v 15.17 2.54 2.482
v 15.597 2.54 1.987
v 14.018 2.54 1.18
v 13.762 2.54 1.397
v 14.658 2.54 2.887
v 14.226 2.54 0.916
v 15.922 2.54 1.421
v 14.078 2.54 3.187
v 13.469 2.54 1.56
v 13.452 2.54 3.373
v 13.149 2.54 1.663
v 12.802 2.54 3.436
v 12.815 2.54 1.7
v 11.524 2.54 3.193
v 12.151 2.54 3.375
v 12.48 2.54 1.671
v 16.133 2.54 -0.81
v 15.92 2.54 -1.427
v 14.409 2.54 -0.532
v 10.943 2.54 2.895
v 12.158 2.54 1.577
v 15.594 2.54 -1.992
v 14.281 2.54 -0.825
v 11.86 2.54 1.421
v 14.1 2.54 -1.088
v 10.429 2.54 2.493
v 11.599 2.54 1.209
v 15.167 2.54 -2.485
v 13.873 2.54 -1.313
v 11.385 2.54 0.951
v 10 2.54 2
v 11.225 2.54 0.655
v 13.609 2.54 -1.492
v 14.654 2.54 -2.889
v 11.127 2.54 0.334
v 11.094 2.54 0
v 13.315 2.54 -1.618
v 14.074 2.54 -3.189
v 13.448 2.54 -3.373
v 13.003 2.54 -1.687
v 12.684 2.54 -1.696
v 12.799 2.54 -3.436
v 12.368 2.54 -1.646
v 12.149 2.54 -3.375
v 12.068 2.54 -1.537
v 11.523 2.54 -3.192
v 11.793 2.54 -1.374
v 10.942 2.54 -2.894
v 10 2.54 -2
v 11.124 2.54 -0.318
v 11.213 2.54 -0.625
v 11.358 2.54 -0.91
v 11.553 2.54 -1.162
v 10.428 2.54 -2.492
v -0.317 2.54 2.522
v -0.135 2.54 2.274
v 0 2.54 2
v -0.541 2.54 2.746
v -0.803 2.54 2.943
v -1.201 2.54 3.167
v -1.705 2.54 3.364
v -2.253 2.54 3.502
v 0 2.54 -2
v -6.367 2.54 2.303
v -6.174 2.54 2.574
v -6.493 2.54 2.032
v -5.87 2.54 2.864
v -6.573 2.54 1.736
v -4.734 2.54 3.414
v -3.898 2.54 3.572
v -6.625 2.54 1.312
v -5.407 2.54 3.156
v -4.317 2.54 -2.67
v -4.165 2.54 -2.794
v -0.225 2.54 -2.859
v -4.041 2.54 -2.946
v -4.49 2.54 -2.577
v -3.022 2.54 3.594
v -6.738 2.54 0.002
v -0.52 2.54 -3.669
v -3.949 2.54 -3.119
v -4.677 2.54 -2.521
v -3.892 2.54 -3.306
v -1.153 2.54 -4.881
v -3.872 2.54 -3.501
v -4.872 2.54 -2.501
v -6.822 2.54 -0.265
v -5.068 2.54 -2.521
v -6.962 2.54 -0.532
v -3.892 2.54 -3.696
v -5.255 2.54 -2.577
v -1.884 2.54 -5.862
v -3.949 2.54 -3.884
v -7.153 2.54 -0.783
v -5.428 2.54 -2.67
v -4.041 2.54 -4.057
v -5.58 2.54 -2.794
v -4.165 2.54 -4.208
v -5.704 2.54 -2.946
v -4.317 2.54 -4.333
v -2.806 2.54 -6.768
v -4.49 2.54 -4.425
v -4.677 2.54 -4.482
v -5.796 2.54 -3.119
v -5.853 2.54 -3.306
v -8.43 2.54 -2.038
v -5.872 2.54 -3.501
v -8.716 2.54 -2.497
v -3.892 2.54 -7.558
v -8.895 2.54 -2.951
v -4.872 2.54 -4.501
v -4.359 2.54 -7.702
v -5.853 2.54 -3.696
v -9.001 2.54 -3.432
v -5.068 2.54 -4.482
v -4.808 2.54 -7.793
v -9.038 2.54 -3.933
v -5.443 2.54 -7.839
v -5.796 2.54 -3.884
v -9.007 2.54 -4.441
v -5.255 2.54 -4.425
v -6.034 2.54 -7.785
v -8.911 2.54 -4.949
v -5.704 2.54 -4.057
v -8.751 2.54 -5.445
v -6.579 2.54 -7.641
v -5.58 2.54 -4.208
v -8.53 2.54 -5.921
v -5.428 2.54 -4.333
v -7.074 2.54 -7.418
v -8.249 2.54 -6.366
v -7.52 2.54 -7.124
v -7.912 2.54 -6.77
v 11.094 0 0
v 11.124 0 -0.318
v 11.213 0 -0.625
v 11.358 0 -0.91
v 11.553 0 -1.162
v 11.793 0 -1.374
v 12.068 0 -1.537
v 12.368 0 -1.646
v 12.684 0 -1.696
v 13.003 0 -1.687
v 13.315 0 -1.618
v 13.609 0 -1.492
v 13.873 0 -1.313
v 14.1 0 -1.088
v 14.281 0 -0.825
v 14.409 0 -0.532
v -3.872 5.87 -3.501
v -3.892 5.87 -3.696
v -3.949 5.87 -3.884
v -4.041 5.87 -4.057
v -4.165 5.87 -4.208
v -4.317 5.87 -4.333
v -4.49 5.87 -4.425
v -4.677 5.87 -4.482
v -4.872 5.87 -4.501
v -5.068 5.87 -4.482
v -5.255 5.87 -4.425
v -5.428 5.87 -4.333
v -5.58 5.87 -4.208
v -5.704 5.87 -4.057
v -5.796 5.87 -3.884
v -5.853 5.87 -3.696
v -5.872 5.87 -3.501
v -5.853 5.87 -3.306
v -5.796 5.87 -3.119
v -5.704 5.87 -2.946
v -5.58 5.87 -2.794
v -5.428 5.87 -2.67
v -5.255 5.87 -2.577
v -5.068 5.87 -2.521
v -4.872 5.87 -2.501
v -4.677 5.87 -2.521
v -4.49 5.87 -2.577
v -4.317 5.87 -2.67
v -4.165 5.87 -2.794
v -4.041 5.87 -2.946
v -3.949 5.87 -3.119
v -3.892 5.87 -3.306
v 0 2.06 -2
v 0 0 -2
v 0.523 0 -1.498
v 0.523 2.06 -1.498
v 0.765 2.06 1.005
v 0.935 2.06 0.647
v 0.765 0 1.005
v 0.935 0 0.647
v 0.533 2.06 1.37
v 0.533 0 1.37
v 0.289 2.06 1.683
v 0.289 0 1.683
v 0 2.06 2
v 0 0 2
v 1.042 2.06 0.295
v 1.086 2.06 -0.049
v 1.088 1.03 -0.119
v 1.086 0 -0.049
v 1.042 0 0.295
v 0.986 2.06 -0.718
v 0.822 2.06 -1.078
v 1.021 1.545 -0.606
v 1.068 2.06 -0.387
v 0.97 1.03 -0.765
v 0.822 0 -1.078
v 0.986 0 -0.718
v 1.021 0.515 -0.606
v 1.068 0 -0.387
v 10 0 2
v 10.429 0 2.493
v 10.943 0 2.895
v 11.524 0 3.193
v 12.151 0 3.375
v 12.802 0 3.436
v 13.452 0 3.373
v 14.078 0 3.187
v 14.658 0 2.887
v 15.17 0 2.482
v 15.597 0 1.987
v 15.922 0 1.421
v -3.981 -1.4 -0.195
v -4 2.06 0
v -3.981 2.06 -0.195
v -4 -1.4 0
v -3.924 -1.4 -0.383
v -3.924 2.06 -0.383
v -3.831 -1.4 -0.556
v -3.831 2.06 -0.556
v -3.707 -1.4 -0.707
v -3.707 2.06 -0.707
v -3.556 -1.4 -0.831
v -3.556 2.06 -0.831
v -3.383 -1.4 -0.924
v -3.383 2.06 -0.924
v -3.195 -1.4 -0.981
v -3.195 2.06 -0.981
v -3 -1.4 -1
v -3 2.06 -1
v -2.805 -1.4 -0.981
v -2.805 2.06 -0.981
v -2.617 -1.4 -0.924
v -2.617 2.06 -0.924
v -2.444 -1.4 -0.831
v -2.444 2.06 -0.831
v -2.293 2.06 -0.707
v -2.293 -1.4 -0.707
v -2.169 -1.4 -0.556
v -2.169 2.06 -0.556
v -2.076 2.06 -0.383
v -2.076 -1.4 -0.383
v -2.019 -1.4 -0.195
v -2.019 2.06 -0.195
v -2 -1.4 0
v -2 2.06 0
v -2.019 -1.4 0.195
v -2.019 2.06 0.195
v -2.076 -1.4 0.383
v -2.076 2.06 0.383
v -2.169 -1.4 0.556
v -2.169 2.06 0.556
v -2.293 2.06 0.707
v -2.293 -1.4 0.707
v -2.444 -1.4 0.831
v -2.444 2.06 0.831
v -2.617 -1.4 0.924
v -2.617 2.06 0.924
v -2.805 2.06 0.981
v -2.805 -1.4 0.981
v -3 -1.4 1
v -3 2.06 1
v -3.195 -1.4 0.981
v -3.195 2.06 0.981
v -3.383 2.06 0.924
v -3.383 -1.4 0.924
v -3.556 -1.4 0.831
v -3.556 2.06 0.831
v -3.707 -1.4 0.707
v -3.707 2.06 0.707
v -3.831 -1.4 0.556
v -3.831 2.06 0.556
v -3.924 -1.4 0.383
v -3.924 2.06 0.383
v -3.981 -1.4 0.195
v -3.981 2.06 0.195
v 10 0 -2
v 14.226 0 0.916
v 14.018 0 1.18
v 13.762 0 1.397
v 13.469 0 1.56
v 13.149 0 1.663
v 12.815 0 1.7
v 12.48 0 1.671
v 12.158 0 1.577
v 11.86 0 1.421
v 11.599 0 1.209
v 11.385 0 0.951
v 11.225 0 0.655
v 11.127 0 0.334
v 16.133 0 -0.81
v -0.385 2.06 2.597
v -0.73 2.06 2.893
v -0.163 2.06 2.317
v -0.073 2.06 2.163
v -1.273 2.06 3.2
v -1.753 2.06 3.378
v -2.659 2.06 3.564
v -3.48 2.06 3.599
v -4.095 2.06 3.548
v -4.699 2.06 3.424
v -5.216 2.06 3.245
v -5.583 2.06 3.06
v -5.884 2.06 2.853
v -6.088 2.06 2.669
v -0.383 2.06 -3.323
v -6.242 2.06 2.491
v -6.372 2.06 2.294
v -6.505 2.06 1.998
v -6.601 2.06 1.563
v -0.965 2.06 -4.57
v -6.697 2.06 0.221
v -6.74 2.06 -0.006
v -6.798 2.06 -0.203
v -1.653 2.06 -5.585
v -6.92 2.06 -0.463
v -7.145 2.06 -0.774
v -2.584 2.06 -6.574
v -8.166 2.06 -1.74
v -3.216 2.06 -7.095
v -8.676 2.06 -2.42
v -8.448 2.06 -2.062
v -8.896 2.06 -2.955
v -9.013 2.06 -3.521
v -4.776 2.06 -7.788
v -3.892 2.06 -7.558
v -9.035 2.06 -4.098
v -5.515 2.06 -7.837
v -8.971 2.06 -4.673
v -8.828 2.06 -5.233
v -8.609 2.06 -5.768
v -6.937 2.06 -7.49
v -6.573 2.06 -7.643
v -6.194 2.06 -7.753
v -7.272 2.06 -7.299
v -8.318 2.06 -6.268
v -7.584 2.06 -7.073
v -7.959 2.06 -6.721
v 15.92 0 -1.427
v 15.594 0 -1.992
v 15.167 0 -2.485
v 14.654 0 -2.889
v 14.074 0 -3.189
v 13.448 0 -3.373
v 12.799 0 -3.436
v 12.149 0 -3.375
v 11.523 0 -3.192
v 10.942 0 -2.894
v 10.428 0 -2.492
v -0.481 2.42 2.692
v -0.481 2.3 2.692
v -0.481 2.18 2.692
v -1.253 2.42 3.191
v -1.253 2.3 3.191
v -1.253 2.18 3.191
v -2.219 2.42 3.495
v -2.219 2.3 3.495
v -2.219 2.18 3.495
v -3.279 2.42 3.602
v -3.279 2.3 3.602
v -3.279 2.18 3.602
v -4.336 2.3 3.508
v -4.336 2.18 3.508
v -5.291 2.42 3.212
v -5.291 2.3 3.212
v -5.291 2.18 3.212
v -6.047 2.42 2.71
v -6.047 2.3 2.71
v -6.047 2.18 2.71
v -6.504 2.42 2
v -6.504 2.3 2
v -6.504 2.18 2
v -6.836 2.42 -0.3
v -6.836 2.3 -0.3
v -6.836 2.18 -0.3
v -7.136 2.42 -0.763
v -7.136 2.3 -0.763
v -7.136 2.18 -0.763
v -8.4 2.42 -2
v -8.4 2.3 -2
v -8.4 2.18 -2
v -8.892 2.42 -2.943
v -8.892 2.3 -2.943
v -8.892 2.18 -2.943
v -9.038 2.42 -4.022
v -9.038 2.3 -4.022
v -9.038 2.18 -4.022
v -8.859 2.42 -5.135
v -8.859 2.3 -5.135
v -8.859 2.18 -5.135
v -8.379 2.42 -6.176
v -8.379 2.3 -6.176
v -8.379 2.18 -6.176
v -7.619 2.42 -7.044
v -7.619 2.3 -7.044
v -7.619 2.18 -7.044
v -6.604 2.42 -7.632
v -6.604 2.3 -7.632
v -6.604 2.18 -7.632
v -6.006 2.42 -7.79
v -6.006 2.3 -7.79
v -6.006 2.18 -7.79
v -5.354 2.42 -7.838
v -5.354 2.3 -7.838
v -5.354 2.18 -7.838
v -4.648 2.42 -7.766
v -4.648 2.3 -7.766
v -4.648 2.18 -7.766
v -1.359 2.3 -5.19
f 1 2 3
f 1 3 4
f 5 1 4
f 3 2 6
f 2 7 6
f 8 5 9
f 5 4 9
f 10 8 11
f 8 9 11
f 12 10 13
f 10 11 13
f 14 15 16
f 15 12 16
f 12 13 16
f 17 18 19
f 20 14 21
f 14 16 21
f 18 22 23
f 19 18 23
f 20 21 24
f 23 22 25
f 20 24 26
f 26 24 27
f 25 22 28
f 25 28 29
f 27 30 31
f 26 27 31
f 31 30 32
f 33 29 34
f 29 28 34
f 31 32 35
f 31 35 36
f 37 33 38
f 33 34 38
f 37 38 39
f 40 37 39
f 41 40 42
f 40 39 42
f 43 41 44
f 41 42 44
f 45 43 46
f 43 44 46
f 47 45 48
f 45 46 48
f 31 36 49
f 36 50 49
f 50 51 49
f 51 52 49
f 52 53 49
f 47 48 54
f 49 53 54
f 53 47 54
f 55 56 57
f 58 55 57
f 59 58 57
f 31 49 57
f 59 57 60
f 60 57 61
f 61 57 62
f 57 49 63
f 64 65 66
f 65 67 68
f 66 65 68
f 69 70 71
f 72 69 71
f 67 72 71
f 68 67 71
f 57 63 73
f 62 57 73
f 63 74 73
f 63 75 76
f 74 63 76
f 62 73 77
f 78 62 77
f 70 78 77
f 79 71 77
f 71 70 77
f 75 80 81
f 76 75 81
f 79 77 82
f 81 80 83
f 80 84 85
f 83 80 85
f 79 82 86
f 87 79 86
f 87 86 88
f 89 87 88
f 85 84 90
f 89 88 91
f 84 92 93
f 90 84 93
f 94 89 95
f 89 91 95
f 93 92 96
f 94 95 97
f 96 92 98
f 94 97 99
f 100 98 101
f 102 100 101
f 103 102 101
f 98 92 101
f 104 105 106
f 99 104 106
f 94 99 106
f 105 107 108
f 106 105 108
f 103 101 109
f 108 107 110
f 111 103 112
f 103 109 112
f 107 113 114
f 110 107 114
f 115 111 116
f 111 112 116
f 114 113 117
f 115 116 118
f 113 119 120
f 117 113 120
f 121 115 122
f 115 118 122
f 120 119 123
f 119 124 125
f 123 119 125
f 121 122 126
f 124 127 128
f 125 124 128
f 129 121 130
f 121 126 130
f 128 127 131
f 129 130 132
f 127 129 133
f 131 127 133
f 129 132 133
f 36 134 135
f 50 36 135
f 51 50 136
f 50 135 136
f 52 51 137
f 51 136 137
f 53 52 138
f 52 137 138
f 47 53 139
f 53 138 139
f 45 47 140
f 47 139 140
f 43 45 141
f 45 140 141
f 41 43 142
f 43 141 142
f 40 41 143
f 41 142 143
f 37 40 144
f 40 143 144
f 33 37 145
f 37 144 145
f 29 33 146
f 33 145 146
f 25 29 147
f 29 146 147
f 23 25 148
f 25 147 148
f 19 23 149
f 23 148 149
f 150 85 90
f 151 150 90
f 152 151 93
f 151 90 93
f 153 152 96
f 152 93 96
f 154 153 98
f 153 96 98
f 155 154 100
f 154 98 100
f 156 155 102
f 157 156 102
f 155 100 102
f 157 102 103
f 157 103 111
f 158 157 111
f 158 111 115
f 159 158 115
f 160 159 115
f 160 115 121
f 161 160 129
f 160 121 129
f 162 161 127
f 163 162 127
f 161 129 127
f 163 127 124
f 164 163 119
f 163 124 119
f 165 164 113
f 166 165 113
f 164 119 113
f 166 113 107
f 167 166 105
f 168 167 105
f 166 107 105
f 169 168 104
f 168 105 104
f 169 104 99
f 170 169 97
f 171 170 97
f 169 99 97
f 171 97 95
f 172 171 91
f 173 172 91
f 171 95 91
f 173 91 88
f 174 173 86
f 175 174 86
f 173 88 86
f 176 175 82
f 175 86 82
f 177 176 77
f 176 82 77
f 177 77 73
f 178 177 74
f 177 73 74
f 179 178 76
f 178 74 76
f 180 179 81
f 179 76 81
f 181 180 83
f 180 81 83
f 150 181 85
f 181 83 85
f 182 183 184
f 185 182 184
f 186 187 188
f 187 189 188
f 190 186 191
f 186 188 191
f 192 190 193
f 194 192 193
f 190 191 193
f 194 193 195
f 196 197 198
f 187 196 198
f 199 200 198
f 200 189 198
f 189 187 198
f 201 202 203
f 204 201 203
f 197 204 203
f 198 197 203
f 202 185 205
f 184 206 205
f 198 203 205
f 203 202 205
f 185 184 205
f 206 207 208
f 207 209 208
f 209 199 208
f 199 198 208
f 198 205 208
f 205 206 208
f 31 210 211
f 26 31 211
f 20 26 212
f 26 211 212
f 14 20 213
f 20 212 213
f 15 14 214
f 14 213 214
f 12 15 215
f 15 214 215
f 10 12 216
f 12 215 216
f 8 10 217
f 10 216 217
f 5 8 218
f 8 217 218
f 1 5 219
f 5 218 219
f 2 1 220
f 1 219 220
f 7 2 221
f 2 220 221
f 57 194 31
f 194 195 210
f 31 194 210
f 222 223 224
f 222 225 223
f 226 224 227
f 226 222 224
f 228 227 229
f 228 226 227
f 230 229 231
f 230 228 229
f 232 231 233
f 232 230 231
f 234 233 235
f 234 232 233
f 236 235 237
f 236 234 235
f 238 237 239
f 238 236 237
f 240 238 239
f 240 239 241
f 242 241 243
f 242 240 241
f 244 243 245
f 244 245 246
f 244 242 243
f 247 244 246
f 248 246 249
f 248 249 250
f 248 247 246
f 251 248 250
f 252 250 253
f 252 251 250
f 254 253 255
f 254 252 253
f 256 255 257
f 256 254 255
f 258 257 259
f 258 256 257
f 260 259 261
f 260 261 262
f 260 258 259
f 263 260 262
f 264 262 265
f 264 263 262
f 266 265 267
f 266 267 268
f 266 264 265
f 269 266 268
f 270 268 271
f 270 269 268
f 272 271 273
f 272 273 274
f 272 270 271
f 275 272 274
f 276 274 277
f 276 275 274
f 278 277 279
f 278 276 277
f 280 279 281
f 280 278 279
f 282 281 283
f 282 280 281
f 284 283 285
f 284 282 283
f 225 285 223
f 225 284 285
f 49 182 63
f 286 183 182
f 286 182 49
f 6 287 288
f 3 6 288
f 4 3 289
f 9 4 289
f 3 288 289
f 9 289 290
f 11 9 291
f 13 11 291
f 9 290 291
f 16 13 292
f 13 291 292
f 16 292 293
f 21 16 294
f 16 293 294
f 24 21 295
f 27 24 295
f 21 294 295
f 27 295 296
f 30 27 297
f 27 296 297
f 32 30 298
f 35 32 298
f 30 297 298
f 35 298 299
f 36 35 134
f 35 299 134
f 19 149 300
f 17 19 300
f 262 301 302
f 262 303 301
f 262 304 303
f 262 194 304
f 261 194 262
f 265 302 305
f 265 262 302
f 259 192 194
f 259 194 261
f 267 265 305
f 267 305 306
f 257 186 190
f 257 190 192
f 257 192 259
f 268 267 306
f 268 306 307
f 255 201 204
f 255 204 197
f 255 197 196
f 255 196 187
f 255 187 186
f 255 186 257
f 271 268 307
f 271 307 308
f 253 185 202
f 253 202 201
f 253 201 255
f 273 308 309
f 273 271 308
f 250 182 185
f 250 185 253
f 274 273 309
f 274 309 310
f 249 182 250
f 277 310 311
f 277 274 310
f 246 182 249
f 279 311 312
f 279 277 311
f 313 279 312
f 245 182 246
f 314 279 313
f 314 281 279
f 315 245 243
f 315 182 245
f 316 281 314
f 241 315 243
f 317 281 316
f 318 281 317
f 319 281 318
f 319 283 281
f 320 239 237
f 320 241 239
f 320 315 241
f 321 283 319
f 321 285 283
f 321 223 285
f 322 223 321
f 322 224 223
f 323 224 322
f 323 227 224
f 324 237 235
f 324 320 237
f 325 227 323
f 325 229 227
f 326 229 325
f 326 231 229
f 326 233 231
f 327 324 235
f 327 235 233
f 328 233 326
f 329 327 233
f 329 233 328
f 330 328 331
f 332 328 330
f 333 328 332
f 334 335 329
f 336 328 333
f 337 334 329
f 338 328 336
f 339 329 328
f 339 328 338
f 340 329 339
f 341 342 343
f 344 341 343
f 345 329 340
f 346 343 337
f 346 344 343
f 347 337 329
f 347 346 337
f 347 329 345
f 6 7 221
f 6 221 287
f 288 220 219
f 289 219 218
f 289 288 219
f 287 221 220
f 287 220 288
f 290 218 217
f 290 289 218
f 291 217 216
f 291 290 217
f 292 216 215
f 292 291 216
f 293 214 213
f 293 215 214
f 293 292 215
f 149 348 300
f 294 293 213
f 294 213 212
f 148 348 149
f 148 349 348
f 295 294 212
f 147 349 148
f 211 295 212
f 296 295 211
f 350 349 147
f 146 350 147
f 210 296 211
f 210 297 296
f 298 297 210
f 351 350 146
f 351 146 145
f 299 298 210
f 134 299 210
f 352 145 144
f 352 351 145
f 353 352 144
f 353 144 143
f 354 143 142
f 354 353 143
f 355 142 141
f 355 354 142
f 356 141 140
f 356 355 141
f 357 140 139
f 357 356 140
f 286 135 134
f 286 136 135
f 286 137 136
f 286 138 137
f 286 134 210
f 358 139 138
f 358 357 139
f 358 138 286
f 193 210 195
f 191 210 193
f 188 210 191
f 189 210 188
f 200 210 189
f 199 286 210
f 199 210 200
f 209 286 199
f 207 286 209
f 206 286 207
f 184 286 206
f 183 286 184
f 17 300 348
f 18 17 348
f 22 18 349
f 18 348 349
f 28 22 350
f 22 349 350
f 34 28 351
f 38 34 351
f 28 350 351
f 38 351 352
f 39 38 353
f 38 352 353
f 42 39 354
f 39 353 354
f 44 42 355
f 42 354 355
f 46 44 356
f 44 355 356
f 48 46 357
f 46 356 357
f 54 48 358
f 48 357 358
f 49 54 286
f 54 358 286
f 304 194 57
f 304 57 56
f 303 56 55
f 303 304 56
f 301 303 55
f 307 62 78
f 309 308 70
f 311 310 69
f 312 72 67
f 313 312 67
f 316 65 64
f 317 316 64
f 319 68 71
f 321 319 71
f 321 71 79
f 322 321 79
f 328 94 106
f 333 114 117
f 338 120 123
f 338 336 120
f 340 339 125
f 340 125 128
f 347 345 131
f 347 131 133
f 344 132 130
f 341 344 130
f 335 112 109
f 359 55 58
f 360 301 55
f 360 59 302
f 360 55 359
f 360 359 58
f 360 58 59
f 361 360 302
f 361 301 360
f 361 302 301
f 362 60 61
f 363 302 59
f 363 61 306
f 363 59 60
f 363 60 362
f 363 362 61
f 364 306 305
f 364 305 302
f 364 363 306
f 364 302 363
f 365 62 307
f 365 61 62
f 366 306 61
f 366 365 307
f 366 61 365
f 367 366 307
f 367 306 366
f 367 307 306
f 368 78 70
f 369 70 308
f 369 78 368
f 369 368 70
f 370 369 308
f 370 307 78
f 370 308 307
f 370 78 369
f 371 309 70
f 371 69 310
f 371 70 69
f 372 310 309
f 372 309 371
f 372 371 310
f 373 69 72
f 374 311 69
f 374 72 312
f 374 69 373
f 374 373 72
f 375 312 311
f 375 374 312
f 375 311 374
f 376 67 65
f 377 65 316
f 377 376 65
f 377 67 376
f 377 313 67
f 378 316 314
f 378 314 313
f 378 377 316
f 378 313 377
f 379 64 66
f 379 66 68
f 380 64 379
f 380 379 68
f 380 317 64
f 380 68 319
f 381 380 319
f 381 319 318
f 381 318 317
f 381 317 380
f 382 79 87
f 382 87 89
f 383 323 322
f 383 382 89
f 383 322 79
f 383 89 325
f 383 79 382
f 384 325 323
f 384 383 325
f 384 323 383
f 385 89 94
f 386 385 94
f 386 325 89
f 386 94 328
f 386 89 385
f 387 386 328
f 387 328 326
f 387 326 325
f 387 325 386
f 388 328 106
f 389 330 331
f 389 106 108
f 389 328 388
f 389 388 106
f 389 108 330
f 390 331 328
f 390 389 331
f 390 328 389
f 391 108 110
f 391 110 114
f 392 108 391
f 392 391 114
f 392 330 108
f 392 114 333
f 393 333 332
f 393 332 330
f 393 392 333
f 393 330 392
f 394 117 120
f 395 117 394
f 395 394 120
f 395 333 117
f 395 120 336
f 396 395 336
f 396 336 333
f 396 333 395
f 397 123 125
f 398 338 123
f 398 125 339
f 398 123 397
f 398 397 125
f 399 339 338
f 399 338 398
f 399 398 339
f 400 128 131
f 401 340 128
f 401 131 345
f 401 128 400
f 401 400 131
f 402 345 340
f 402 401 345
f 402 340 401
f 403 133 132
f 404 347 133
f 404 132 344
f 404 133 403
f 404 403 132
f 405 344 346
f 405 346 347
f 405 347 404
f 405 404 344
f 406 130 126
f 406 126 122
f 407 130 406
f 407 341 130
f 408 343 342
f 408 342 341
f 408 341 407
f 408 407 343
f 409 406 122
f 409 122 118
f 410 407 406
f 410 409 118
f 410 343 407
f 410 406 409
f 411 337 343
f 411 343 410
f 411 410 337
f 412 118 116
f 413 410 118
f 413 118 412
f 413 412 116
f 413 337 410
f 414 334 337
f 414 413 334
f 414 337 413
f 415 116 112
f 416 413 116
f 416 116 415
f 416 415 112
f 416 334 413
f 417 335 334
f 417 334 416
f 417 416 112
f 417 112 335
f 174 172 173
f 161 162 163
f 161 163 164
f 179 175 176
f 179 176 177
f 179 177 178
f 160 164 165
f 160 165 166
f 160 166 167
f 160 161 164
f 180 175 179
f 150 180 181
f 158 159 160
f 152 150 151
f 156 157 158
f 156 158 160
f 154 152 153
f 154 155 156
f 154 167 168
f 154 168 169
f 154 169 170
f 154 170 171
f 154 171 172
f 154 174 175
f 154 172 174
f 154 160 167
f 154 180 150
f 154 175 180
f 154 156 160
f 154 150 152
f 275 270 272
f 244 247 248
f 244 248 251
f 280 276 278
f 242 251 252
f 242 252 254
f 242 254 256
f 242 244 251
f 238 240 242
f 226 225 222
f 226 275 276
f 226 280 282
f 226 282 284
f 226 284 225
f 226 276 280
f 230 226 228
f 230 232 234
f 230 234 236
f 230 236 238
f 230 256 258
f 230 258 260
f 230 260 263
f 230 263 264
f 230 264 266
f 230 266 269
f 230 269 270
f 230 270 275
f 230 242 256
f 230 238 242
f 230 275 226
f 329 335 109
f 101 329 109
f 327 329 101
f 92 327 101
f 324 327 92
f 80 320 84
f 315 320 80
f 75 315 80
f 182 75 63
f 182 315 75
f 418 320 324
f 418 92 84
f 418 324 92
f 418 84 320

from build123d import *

# Parameters (mm, degrees)
SKETCH1_W               = 10
SKETCH1_H               = 4
BOSS_EXTRUDE2_DEPTH     = 2.54
SKETCH3_R               = 1
BOSS_EXTRUDE3_DEPTH     = 1.5
SKETCH4_R               = 1
BOSS_EXTRUDE5_DEPTH     = 1.5
SKETCH7_R               = 1
BOSS_EXTRUDE6_DEPTH     = 3.33
SKETCH8_R               = 1
BOSS_EXTRUDE7_DEPTH     = 1.3996
SKETCH9_R               = 1
CUT_EXTRUDE1_DEPTH      = 3.33
CUT_EXTRUDE1_DEPTH_BACK = 2.06
SKETCH10_R              = 1.862138251
CUT_EXTRUDE2_DEPTH      = 2.06


with BuildPart() as part:
    # Sketch1 → Boss-Extrude2 (new body)
    with BuildSketch(Plane(origin=(0, 0, 0), x_dir=(1, 0, 0), z_dir=(0, 1, 0))):
        with BuildLine():
            add(Edge.make_bspline(
                [(-3.892071286, 7.55845385), (-0.771451313, 5.601679727), (0, 2)],
                knots=[0, 0, 0, 1, 1, 1], degree=2))
            Line((0, 2), (0, -2))
            add(Edge.make_bspline(
                [(0, -2), (-0.807019421, -4.0986057), (-7.360800537, -4.196276699), (-6.343457725, 0.548340217), (-10.778232398, 2.929025773), (-8.051665625, 9.045483404), (-3.892071286, 7.55845385)],
                knots=[0, 0, 0, 0, 0.355860313, 0.470047608, 0.583542681, 1, 1, 1, 1], degree=3))
        make_face()
        with Locations((5, 0)):
            Rectangle(SKETCH1_W, SKETCH1_H)
        with BuildLine():
            Line((11.094, 0), (10, 0))
            Line((10, 0), (10, -2))
            ThreePointArc((10, -2), (13.128207579, -3.419757491), (15.922350304, -1.421217919))
            Line((15.922350304, -1.421217919), (14.22610231, -0.916014724))
            ThreePointArc((14.22610231, -0.916014724), (12.316807128, -1.631651606), (11.094, 0))
        make_face()
        with BuildLine():
            Line((10, 2), (10, 0))
            Line((10, 0), (11.094, 0))
            ThreePointArc((11.094, 0), (12.524636877, 1.678524205), (14.408639421, 0.531920615))
            Line((14.408639421, 0.531920615), (16.133188964, 0.810094479))
            ThreePointArc((16.133188964, 0.810094479), (13.448428406, 3.373152748), (10, 2))
        make_face()
    extrude(amount=BOSS_EXTRUDE2_DEPTH)

    # Sketch3 → Boss-Extrude3 (add)
    with BuildSketch(Plane(origin=(0, 2.54, 0), x_dir=(1, 0, 0), z_dir=(0, 1, 0))):
        with Locations((-3, 0)):
            Circle(SKETCH3_R)
    extrude(amount=BOSS_EXTRUDE3_DEPTH)

    # Sketch4 → Boss-Extrude5 (add)
    with BuildSketch(Plane(origin=(0, 0, 0), x_dir=(-1, 0, 0), z_dir=(0, -1, 0))):
        with Locations((4.872437244, 3.501336217)):
            Circle(SKETCH4_R)
    extrude(amount=BOSS_EXTRUDE5_DEPTH)

    # Sketch7 → Boss-Extrude6 (add)
    with BuildSketch(Plane(origin=(0, 2.54, 0), x_dir=(1, 0, 0), z_dir=(0, 1, 0))):
        with Locations((-4.872437244, 3.501336217)):
            Circle(SKETCH7_R)
    extrude(amount=BOSS_EXTRUDE6_DEPTH)

    # Sketch8 → Boss-Extrude7 (add)
    with BuildSketch(Plane(origin=(0, 0, 0), x_dir=(-1, 0, 0), z_dir=(0, -1, 0))):
        with Locations((3, 0)):
            Circle(SKETCH8_R)
    extrude(amount=BOSS_EXTRUDE7_DEPTH)

    # Sketch9 → Cut-Extrude1 (cut, two sides)
    with BuildSketch(Plane(origin=(0, 0, 0), x_dir=(-1, 0, 0), z_dir=(0, -1, 0))) as cut_extrude1_sk:
        with BuildLine():
            Line((0, 8.859088838), (0, 2))
            add(Edge.make_bspline(
                [(0, 2), (-2.175152806, 0.238184258), (0, -2)],
                knots=[0, 0, 0, 1, 1, 1], degree=2))
            Line((0, -2), (0, -4.672458071))
            Line((0, -4.672458071), (11.092635024, -4.672458071))
            Line((11.092635024, -4.672458071), (11.092635024, 8.859088838))
            Line((11.092635024, 8.859088838), (0, 8.859088838))
        make_face()
        with Locations((3, 0)):
            Circle(SKETCH9_R, mode=Mode.SUBTRACT)
    extrude(amount=CUT_EXTRUDE1_DEPTH, mode=Mode.SUBTRACT)
    extrude(cut_extrude1_sk.sketch, amount=-CUT_EXTRUDE1_DEPTH_BACK, mode=Mode.SUBTRACT)

    # Sketch10 → Cut-Extrude2 (cut)
    with BuildSketch(Plane(origin=(0, 2.54, 0), x_dir=(1, 0, 0), z_dir=(0, 1, 0))):
        with Locations((-2.940866893, -0.166273011)):
            Circle(SKETCH10_R)
    extrude(amount=CUT_EXTRUDE2_DEPTH, mode=Mode.SUBTRACT)


solid = part.part
